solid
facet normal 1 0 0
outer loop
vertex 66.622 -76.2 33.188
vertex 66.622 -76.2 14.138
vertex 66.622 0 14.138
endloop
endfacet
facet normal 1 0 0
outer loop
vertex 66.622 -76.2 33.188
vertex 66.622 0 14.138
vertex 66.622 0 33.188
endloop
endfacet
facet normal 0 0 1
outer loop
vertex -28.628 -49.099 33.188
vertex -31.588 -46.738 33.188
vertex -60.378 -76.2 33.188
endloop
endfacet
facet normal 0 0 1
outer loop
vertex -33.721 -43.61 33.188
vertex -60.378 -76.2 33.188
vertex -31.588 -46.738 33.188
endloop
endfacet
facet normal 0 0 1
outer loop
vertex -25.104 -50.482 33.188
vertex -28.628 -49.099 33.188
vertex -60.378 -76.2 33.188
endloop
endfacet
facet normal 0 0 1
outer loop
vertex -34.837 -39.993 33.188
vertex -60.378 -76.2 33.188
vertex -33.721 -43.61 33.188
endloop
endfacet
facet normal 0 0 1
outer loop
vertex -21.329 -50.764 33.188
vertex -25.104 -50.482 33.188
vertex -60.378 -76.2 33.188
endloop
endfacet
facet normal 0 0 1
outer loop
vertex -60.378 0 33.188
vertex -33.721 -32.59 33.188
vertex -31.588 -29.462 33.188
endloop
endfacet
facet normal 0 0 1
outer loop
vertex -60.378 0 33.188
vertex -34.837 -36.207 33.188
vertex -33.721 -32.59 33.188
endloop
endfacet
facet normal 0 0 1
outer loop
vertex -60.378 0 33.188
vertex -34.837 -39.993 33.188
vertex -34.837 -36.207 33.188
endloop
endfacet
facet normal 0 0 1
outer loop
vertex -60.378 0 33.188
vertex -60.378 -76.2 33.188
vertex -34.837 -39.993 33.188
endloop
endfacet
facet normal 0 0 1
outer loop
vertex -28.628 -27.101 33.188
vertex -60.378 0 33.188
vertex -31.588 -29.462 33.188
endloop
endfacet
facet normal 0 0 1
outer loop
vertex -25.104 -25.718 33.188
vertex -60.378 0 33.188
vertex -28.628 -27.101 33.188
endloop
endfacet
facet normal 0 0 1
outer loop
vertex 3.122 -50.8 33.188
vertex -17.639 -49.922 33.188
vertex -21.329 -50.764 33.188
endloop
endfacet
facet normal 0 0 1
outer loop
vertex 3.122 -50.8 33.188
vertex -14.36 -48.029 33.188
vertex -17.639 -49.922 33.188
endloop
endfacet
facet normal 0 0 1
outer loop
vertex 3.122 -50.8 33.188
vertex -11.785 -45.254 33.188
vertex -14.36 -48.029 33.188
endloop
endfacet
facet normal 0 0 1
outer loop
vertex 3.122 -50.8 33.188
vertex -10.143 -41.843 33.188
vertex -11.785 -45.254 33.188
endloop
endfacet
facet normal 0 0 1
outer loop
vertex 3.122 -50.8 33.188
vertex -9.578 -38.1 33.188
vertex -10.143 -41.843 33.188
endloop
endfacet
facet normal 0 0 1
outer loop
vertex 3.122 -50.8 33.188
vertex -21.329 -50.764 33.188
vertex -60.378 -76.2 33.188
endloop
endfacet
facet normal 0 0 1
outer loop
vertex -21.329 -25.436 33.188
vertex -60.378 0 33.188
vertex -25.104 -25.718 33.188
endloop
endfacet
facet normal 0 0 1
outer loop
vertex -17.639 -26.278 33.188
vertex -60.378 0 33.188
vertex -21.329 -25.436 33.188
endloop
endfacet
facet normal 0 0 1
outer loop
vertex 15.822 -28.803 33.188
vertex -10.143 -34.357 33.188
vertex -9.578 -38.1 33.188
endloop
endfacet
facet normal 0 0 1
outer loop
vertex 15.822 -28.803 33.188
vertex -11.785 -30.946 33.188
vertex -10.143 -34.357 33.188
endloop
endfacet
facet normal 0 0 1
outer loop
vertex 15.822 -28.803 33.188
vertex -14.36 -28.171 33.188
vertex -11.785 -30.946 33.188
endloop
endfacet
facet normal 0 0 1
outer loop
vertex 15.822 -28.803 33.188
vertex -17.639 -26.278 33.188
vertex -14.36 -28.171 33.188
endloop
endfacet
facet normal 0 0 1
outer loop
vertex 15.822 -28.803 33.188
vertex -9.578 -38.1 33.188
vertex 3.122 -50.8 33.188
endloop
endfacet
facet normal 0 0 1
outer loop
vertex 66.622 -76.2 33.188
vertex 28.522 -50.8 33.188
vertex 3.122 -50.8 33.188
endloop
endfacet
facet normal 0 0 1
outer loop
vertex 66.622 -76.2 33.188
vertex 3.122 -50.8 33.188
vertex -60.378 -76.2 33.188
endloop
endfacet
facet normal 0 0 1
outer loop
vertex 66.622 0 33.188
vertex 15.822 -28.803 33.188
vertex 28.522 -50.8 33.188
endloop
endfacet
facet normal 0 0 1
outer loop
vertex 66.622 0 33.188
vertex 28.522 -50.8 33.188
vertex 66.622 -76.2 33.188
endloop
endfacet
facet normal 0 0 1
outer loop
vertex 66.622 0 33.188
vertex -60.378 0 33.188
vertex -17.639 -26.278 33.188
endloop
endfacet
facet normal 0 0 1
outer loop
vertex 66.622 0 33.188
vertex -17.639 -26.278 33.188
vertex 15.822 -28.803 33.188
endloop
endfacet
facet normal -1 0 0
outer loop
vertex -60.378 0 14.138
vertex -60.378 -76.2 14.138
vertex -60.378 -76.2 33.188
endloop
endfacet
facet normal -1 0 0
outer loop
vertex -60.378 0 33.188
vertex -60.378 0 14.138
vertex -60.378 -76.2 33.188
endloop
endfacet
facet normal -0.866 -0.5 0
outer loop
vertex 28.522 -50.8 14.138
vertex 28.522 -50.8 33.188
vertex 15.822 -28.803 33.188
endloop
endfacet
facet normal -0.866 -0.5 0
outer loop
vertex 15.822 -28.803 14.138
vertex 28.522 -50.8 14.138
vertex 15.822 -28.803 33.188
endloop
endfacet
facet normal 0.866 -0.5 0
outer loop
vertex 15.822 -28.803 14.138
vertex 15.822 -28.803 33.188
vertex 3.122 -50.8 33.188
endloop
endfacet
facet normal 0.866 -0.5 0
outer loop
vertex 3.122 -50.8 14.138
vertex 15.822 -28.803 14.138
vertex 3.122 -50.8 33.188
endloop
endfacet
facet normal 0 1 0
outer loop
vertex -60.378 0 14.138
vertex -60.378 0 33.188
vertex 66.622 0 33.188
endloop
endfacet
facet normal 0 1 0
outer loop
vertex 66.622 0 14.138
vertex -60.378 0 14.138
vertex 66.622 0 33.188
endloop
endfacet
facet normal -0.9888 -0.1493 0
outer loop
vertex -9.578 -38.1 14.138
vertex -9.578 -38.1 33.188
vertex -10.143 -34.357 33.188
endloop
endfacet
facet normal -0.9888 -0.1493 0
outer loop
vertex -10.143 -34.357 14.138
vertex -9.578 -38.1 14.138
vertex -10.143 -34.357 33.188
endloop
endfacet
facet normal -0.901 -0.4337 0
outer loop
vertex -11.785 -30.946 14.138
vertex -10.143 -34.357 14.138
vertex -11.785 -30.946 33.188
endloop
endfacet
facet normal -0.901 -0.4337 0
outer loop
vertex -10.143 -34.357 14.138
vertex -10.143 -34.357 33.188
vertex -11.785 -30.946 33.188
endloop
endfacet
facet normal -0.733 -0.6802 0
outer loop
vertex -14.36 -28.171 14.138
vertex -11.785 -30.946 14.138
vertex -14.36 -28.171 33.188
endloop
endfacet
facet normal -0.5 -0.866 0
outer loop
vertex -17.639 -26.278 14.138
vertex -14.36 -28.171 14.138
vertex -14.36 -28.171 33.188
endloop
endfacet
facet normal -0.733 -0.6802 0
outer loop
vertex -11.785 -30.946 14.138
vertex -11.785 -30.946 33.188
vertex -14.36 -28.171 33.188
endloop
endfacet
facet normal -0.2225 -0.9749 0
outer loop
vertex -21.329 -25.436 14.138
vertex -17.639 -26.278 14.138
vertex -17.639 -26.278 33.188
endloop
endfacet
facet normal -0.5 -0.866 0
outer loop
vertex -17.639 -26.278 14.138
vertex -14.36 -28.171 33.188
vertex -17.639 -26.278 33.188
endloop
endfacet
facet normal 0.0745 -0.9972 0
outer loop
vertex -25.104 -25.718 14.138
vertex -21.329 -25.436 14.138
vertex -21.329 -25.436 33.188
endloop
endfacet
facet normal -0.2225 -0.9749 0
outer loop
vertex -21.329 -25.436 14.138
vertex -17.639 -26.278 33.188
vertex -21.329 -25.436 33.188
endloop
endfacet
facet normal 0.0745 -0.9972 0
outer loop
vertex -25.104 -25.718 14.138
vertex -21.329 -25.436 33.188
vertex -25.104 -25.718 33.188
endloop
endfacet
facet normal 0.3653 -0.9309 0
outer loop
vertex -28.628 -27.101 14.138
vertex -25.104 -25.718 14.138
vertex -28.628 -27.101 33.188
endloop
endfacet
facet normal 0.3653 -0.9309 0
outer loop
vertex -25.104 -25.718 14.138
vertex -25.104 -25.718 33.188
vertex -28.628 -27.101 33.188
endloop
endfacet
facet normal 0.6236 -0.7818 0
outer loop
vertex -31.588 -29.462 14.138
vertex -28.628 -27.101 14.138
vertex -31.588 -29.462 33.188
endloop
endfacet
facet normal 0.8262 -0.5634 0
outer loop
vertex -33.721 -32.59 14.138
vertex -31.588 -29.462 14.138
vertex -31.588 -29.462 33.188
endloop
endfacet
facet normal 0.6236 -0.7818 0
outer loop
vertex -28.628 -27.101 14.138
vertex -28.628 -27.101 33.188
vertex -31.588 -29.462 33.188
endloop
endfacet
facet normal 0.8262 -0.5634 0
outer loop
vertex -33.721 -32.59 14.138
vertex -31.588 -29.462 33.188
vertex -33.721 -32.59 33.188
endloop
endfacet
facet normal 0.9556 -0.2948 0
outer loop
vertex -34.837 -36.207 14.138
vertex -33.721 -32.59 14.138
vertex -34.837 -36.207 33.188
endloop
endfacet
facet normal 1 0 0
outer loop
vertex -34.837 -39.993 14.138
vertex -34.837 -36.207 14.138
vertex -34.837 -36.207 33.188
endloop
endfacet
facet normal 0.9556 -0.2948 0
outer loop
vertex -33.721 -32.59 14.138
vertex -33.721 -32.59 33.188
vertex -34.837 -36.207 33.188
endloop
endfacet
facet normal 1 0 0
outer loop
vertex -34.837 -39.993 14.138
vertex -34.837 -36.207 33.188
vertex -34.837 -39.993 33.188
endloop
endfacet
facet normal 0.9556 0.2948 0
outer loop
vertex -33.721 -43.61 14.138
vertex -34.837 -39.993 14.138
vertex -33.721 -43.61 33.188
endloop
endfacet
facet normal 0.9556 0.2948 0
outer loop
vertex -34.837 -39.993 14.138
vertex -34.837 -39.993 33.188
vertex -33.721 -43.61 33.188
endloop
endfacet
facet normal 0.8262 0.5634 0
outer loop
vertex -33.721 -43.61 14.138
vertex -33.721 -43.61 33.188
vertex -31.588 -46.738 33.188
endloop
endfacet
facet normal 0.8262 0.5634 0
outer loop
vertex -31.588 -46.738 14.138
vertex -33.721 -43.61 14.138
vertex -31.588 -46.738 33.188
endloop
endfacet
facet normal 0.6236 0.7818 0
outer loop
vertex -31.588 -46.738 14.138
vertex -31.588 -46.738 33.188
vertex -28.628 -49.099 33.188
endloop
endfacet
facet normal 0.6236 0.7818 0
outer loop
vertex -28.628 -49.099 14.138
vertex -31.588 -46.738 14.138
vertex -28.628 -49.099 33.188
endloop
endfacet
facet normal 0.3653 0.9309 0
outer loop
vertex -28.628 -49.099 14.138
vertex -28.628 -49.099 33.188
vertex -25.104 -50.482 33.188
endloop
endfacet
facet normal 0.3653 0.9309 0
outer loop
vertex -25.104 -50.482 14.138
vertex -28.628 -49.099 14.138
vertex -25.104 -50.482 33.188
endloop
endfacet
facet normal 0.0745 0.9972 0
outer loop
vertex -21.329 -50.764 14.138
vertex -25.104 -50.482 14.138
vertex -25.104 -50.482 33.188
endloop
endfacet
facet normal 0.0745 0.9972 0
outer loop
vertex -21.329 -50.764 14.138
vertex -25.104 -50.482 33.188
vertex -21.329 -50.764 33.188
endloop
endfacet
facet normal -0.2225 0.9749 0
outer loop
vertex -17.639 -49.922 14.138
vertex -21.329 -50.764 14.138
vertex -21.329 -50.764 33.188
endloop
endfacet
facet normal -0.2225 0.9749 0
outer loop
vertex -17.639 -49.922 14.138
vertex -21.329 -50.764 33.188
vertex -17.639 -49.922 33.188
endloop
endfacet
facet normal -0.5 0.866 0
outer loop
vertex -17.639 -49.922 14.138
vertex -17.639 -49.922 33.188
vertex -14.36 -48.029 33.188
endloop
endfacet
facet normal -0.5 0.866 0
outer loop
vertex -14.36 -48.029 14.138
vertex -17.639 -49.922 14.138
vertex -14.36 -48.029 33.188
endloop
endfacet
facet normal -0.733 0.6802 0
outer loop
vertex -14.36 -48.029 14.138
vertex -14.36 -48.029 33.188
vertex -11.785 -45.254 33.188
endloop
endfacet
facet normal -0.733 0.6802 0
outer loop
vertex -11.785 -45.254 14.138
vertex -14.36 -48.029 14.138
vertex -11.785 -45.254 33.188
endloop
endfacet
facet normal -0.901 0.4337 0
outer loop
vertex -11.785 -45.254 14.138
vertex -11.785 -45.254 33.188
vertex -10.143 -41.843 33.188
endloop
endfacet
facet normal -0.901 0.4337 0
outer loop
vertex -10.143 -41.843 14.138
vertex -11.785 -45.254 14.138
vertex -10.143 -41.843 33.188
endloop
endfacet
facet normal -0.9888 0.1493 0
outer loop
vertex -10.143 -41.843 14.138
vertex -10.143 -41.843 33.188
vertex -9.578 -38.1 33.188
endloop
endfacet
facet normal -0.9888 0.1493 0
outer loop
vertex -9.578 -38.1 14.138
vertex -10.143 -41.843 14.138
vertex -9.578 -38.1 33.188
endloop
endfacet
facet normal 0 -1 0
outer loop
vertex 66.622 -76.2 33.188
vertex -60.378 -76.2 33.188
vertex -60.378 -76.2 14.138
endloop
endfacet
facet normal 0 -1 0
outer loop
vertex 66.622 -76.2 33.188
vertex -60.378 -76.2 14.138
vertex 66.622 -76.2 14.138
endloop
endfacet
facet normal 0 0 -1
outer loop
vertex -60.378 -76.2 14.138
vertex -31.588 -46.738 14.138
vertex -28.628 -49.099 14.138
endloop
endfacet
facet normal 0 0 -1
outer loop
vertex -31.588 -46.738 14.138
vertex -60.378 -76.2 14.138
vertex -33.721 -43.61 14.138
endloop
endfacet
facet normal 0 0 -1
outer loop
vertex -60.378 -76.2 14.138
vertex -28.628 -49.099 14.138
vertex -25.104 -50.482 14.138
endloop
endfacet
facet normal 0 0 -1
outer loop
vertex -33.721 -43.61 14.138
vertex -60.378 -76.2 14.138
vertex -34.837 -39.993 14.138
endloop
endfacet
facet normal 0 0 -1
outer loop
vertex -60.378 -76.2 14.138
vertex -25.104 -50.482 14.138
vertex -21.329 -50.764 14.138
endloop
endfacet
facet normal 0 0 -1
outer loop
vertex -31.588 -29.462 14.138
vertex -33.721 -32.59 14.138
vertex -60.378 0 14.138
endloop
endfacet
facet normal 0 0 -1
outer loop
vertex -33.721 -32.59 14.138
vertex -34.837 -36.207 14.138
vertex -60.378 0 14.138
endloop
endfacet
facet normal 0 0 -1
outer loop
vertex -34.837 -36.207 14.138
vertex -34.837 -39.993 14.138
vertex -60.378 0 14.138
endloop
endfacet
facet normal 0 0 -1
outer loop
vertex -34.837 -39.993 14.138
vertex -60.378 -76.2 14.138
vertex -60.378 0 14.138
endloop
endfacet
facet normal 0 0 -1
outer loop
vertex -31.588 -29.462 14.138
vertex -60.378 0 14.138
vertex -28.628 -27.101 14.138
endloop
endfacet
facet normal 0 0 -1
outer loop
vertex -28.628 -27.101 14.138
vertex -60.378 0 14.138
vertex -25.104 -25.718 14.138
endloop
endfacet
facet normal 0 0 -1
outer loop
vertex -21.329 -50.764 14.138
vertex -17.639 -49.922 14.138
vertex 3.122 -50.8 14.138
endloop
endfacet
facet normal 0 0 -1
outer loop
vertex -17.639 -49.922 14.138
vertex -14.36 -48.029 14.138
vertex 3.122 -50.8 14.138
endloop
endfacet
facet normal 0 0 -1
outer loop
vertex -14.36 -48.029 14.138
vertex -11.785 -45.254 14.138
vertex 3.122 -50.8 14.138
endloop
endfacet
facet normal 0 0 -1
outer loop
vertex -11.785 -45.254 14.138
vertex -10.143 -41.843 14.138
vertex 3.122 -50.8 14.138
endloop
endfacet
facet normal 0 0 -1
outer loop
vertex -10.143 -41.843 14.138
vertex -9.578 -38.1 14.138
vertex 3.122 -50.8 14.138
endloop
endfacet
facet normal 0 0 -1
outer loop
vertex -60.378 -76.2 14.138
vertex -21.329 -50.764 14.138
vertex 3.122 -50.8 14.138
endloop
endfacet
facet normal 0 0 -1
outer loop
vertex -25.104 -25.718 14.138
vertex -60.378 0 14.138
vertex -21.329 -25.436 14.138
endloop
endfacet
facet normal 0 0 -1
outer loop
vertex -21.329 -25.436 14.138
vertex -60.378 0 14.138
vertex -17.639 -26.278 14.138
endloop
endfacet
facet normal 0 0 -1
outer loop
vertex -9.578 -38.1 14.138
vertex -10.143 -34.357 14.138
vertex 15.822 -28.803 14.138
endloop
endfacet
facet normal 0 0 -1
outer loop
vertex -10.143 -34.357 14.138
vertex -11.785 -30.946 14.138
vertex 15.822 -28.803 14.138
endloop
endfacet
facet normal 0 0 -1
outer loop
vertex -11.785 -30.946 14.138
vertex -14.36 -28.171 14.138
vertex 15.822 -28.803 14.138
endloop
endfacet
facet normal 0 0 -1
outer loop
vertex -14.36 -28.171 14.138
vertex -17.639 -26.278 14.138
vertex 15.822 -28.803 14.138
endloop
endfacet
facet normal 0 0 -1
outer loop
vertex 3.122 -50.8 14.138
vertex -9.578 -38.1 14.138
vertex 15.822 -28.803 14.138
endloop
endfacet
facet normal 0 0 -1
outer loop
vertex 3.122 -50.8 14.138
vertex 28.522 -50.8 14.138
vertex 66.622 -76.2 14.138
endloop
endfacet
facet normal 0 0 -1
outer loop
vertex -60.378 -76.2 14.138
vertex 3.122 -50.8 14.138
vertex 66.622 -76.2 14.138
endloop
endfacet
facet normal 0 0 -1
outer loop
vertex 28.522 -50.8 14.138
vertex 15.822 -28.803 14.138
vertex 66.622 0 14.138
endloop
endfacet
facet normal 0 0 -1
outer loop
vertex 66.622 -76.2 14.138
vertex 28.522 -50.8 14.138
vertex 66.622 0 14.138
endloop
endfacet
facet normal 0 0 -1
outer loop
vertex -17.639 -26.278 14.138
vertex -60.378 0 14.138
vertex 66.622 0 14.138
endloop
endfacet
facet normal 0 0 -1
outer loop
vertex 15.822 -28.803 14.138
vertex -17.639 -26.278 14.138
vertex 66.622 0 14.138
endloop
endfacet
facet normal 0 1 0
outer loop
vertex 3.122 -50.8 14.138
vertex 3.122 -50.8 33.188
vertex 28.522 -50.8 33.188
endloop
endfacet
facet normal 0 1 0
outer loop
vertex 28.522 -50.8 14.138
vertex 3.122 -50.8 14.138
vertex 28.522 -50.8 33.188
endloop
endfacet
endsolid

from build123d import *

# Parameters (mm, degrees)
F0_W     = 127
F0_H     = 19.05
F1_DEPTH = 76.2
F2_R     = 12.7
F3_DEPTH = 25.4
F5_DEPTH = 25.4


with BuildPart() as f1:
    # F0 (on Front) → F1 (new body)
    with BuildSketch(Plane.XZ):
        with Locations((3.121564, 23.662644)):
            Rectangle(F0_W, F0_H)
    extrude(amount=F1_DEPTH)

    # F2 (on face) → F3 (cut)
    with BuildSketch(Plane.XY.offset(33.187644)):
        with Locations((-22.278436, -38.1)):
            Circle(F2_R)
    extrude(amount=-F3_DEPTH, mode=Mode.SUBTRACT)

    # F4 (on face) → F5 (cut)
    with BuildSketch(Plane.XY.offset(33.187644)):
        Polygon((28.521564, -50.8), (15.821564, -28.802955), (3.121564, -50.8), align=None)
    extrude(amount=-F5_DEPTH, mode=Mode.SUBTRACT)


solid = f1.part
